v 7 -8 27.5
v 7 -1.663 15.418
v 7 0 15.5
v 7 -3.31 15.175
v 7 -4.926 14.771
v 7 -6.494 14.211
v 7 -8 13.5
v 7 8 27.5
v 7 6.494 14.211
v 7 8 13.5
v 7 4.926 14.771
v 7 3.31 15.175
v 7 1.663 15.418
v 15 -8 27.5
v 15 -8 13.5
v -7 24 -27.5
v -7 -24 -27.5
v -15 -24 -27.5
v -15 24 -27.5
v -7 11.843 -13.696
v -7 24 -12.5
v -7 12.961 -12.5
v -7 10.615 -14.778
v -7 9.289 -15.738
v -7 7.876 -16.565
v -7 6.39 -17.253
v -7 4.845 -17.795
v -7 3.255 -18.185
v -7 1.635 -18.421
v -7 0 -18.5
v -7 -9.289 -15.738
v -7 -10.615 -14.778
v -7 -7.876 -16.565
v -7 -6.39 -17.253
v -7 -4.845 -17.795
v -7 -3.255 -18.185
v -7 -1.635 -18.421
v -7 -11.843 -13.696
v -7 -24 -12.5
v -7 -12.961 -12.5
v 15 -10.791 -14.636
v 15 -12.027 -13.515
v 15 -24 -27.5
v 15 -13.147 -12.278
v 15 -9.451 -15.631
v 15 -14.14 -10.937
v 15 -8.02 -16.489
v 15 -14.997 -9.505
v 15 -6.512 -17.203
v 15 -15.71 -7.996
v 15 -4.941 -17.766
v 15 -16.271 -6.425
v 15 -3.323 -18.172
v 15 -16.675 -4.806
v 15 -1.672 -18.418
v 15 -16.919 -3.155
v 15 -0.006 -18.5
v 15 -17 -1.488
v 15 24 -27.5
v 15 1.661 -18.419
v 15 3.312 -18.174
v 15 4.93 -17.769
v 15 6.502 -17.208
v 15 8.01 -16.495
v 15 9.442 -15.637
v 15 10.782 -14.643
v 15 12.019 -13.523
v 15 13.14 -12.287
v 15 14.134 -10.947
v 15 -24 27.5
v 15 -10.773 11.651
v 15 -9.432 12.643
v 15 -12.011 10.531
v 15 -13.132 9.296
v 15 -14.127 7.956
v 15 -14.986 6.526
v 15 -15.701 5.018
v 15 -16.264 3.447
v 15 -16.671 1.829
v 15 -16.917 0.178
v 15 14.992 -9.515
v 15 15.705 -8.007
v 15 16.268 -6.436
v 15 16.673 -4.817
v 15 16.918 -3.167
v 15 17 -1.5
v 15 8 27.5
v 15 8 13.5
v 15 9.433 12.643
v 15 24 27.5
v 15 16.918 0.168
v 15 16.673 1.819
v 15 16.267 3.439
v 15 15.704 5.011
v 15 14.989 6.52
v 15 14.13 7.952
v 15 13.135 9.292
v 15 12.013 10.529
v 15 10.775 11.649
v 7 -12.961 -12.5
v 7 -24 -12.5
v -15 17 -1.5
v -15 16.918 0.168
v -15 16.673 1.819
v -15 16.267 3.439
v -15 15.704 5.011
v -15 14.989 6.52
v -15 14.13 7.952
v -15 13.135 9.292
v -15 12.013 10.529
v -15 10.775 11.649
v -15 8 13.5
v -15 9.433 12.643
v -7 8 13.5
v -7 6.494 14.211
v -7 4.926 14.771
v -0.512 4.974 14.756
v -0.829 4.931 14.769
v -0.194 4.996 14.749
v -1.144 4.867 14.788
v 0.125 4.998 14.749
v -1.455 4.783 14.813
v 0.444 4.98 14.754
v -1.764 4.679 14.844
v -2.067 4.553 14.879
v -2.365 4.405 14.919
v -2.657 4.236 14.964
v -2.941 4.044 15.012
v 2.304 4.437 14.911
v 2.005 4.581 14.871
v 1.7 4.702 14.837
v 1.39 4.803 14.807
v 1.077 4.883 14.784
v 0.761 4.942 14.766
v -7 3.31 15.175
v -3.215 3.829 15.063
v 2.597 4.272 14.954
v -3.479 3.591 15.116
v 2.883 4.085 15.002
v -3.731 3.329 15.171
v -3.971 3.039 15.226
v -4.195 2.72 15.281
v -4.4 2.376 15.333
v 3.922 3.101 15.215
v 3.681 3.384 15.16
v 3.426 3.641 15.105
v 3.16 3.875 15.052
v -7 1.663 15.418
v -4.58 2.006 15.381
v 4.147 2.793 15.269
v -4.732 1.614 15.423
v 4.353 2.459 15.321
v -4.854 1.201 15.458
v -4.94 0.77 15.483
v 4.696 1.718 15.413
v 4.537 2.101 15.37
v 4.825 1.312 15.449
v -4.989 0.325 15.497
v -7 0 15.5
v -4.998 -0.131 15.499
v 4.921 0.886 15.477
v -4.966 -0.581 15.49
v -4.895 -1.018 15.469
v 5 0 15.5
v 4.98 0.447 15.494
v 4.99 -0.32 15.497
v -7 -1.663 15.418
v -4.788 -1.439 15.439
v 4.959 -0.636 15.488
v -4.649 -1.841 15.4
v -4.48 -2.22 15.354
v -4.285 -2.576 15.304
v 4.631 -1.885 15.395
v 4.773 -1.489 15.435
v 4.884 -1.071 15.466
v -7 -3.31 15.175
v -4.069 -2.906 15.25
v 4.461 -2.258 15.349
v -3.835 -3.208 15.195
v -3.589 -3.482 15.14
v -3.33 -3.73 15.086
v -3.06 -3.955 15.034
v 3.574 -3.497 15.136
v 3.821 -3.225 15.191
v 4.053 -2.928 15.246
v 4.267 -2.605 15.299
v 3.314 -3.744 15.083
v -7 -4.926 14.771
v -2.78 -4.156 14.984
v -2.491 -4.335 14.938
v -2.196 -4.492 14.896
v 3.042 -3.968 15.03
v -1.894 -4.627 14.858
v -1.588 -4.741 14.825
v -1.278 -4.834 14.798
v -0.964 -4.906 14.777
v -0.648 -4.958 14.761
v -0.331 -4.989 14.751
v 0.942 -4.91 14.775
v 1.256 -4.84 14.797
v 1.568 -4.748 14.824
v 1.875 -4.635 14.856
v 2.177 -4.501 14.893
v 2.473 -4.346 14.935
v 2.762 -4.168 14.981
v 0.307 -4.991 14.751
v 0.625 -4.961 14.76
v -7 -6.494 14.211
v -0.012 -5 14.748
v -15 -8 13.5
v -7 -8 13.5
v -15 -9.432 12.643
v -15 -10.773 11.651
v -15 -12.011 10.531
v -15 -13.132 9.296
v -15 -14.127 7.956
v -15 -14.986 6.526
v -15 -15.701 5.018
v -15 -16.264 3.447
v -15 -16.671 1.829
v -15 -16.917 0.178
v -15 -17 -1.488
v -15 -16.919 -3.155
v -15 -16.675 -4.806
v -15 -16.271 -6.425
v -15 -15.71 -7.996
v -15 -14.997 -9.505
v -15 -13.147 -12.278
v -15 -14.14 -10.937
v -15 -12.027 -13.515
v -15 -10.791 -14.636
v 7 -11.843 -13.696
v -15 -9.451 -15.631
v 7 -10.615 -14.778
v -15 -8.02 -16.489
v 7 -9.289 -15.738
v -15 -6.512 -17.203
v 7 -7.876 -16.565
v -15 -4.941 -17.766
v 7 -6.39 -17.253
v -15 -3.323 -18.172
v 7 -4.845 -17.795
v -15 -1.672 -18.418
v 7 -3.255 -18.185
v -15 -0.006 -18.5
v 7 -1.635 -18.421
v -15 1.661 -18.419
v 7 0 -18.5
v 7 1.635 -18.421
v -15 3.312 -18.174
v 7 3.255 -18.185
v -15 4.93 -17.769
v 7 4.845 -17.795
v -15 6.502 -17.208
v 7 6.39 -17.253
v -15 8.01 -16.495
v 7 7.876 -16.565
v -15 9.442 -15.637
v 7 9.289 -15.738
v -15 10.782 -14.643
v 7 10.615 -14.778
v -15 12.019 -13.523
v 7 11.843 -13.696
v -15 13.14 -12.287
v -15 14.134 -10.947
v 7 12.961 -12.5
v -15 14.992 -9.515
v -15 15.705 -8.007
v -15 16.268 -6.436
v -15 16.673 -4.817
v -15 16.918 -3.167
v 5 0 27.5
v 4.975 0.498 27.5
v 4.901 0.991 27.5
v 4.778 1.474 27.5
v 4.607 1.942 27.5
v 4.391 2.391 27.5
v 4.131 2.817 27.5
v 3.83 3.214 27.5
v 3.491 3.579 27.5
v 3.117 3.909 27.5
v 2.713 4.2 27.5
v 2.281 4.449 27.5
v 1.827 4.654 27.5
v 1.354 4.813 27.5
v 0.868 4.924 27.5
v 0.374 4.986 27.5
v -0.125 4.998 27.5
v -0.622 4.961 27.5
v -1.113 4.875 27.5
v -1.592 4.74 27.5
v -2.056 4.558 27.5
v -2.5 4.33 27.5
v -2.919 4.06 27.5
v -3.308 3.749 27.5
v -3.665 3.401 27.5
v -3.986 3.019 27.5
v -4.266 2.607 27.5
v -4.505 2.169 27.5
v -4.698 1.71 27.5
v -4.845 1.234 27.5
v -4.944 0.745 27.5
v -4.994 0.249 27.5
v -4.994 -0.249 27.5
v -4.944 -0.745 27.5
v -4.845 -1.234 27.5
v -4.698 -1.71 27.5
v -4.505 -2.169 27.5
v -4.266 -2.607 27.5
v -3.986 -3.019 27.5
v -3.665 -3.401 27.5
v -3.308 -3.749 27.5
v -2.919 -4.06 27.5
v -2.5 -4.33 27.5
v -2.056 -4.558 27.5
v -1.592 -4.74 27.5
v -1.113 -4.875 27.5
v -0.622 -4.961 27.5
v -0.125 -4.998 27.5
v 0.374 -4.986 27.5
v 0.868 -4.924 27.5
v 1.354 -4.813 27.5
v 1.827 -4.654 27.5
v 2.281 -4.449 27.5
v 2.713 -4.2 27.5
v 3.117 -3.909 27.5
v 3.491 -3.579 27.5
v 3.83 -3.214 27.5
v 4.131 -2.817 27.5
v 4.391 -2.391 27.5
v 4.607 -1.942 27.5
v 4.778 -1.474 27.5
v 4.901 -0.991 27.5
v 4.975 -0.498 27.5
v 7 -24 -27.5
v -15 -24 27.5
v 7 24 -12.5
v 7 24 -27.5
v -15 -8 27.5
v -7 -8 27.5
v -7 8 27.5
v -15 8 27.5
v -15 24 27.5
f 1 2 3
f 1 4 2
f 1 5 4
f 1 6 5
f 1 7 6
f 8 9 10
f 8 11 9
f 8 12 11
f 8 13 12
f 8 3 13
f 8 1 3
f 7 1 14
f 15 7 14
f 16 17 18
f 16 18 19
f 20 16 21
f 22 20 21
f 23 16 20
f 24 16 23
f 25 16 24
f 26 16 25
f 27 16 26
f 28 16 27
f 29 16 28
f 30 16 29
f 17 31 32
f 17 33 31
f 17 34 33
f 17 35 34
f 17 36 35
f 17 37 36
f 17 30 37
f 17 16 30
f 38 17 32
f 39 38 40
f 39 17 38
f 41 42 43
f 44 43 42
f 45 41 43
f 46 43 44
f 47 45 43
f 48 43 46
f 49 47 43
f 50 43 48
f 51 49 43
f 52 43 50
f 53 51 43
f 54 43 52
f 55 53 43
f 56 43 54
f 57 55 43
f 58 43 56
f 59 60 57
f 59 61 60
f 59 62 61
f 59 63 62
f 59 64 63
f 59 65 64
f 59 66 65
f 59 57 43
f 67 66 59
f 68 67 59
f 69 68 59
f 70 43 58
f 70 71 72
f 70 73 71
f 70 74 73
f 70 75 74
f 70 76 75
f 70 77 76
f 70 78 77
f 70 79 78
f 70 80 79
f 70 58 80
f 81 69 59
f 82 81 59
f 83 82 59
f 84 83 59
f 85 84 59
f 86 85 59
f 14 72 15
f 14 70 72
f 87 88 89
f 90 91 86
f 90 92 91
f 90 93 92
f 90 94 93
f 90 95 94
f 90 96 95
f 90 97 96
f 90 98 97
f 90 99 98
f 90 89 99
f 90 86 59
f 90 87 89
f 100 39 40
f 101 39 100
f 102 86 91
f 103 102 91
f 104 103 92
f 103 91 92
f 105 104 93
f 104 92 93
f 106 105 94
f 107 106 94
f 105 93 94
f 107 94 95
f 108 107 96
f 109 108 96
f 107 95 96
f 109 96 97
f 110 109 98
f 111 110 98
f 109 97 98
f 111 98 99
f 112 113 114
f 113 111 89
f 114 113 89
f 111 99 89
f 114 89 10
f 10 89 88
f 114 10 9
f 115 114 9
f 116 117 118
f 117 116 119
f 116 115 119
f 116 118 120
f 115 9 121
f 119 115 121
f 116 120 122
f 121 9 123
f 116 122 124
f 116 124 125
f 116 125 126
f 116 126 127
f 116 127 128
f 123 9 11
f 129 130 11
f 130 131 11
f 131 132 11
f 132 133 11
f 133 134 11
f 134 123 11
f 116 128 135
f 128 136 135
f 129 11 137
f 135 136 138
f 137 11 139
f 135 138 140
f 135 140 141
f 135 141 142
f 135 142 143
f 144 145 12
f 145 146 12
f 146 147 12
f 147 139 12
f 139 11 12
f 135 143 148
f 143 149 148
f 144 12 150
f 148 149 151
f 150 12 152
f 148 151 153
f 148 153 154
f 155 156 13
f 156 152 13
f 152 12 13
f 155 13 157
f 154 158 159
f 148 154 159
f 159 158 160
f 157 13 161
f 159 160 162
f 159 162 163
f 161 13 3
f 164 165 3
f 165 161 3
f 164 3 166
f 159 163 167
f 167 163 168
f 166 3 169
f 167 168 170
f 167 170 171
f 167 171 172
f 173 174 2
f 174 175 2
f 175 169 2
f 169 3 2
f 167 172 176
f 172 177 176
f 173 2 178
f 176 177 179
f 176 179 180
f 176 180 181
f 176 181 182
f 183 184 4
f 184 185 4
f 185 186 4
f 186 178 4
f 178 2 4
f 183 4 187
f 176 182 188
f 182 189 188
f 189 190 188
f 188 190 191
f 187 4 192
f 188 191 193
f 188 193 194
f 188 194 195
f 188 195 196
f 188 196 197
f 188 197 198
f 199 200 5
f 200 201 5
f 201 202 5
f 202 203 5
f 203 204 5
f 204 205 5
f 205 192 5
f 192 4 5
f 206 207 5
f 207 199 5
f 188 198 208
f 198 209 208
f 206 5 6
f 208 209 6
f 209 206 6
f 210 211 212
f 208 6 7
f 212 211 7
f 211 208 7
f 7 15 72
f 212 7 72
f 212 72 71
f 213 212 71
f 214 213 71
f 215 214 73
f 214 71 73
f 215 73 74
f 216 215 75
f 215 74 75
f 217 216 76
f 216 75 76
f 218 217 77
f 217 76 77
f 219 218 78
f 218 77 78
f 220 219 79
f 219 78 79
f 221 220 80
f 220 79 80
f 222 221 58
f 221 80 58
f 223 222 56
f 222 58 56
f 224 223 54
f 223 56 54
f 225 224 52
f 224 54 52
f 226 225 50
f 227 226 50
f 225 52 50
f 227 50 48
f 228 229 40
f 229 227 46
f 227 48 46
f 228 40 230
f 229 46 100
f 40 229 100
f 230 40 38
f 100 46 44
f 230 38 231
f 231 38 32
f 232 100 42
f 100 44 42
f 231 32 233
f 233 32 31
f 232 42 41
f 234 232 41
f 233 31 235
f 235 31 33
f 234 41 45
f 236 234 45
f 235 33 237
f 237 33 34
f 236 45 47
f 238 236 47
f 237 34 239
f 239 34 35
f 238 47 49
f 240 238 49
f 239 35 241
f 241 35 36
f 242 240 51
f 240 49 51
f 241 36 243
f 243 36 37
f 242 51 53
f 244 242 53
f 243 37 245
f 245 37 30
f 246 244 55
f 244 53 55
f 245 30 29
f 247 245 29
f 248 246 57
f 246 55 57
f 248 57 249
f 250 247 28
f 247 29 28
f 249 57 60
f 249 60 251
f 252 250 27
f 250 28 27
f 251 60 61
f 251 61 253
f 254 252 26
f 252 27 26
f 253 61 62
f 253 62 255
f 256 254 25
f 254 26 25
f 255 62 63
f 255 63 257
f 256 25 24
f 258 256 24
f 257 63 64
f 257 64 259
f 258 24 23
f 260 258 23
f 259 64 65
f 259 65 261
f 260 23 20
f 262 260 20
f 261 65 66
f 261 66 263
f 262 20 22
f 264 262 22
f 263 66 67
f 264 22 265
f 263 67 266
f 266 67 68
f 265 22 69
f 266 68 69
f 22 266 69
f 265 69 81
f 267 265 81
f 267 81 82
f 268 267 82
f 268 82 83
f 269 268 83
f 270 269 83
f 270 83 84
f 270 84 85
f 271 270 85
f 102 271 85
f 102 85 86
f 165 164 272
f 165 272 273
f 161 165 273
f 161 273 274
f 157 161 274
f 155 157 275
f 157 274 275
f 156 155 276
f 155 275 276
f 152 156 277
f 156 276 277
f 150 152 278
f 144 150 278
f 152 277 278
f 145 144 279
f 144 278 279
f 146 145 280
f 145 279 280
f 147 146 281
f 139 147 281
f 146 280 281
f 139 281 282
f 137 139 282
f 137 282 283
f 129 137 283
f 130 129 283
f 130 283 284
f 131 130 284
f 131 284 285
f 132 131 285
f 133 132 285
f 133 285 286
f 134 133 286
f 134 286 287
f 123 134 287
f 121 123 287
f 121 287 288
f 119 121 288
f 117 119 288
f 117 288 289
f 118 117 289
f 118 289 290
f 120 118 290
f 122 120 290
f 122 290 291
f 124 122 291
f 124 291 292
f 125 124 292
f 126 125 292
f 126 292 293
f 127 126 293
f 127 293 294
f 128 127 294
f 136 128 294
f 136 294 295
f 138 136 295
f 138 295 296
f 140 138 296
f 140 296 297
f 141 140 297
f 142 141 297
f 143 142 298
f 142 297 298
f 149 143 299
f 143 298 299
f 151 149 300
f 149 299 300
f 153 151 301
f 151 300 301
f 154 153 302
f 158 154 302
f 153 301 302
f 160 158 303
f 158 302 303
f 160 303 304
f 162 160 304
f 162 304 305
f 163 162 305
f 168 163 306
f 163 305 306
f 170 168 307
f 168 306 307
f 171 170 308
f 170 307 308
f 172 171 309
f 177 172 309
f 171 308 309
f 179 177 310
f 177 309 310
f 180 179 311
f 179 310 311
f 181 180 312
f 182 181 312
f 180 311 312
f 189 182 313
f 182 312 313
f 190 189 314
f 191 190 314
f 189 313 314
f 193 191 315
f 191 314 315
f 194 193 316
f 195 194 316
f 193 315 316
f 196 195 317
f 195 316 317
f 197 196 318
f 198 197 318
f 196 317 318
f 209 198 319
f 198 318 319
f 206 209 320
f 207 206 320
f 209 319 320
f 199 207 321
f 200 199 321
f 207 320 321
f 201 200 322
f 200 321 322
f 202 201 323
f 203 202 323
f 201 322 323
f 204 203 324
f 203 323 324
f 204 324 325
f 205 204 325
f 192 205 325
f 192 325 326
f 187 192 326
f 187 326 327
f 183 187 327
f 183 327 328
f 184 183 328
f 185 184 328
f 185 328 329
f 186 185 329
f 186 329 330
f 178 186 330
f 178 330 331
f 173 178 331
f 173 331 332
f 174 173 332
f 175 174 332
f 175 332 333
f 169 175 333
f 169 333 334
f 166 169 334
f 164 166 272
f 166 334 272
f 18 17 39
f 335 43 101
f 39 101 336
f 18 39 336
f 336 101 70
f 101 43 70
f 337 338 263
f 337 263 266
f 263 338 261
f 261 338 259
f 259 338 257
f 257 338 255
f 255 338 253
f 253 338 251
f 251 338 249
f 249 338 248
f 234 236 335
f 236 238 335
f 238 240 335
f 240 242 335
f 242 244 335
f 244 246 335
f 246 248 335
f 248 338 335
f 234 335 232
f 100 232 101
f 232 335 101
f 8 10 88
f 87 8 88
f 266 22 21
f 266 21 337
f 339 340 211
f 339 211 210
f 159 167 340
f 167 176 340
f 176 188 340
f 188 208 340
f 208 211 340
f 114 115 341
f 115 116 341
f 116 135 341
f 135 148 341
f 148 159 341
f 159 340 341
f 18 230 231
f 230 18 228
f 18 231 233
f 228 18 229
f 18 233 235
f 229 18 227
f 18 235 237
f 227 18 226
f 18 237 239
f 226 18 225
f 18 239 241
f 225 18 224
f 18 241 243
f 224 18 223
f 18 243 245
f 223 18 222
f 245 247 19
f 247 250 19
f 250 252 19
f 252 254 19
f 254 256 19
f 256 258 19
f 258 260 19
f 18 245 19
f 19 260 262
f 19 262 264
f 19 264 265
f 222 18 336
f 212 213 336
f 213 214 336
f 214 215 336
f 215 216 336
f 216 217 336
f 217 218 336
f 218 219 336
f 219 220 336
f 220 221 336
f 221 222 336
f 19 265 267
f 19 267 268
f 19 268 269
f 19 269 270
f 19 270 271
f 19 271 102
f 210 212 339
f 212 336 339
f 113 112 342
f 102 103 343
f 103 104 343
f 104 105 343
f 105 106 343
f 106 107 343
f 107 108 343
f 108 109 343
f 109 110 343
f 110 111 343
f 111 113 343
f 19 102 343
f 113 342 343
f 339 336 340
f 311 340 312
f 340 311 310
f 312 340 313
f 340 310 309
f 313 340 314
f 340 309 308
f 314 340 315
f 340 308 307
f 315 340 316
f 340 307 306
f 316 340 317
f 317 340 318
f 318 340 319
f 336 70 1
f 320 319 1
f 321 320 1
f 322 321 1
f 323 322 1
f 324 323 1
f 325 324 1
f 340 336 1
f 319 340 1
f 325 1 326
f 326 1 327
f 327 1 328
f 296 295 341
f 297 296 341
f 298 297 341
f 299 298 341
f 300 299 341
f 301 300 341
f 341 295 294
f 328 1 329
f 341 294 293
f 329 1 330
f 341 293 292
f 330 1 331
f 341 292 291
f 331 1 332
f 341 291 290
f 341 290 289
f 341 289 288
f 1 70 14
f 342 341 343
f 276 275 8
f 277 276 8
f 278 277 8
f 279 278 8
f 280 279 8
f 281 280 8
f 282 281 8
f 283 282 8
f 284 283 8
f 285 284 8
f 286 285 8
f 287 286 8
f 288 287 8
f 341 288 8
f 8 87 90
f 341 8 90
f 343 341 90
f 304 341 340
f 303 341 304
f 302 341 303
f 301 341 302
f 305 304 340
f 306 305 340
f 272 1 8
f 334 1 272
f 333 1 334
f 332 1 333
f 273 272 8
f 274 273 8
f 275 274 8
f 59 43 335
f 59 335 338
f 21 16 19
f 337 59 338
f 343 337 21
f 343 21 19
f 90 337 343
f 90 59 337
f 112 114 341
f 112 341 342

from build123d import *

# Parameters (mm, degrees)
F0_W     = 48
F0_H     = 55
F1_DEPTH = 15
F2_R     = 17
F3_DEPTH = 30.001
F4_W     = 8
F4_H     = 16
F5_REACH = 72.88954382
F6_R     = 5
F7_REACH = 69.1431356237
F8_W     = 14
F8_H     = 15
F9_DEPTH = 48.001


# Not quite as in the source:
# - a pattern or mirror of a feature is missing from the dataset's text; its kind, count and spacing are read off the source's solid


with BuildPart() as f1:
    # F0 (on Right) → F1 (new body, symmetric)
    with BuildSketch(Plane.YZ):
        Rectangle(F0_W, F0_H)
    extrude(amount=F1_DEPTH, both=True)

    # F2 (on face) → F3 (cut, through all)
    with BuildSketch(Plane.YZ.offset(15)):
        with Locations((0, -1.5)):
            Circle(F2_R)
    extrude(amount=-F3_DEPTH, mode=Mode.SUBTRACT)

    f5_end = f1.faces().sort_by_distance((0, -17, -1.5))[0]
    # F4 (on face) → F5 (cut, up to a face of the model that its end follows)
    with BuildSketch(Plane.XY.offset(27.5)):
        with Locations((11, 0)):
            Rectangle(F4_W, F4_H)
    f5_long = extrude(amount=-F5_REACH, mode=Mode.PRIVATE)
    f5 = split(f5_long, bisect_by=f5_end, keep=Keep.ALL, mode=Mode.PRIVATE).solids().sort_by_distance((11, 0, 27.5))[0]
    add(f5, mode=Mode.SUBTRACT)

    # F5_copies: F5 across plane
    add(f5.mirror(Plane(origin=(0, 0, 0), x_dir=(0, 0, -1), z_dir=(-1, 0, 0))), mode=Mode.SUBTRACT)

    f7_end = f1.faces().sort_by_distance((0, -17, -1.5))[0]
    # F6 (on face) → F7 (cut, up to a face of the model that its end follows)
    with BuildSketch(Plane.XY.offset(27.5)):
        Circle(F6_R)
    f7_long = extrude(amount=-F7_REACH, mode=Mode.PRIVATE)
    add(split(f7_long, bisect_by=f7_end, keep=Keep.ALL, mode=Mode.PRIVATE).solids().sort_by_distance((0, 0, 27.5))[0], mode=Mode.SUBTRACT)

    # F8 (on face) → F9 (cut, through all)
    with BuildSketch(Plane.XZ.offset(24)):
        with Locations((0, -20)):
            Rectangle(F8_W, F8_H)
    extrude(amount=-F9_DEPTH, mode=Mode.SUBTRACT)


solid = f1.part
